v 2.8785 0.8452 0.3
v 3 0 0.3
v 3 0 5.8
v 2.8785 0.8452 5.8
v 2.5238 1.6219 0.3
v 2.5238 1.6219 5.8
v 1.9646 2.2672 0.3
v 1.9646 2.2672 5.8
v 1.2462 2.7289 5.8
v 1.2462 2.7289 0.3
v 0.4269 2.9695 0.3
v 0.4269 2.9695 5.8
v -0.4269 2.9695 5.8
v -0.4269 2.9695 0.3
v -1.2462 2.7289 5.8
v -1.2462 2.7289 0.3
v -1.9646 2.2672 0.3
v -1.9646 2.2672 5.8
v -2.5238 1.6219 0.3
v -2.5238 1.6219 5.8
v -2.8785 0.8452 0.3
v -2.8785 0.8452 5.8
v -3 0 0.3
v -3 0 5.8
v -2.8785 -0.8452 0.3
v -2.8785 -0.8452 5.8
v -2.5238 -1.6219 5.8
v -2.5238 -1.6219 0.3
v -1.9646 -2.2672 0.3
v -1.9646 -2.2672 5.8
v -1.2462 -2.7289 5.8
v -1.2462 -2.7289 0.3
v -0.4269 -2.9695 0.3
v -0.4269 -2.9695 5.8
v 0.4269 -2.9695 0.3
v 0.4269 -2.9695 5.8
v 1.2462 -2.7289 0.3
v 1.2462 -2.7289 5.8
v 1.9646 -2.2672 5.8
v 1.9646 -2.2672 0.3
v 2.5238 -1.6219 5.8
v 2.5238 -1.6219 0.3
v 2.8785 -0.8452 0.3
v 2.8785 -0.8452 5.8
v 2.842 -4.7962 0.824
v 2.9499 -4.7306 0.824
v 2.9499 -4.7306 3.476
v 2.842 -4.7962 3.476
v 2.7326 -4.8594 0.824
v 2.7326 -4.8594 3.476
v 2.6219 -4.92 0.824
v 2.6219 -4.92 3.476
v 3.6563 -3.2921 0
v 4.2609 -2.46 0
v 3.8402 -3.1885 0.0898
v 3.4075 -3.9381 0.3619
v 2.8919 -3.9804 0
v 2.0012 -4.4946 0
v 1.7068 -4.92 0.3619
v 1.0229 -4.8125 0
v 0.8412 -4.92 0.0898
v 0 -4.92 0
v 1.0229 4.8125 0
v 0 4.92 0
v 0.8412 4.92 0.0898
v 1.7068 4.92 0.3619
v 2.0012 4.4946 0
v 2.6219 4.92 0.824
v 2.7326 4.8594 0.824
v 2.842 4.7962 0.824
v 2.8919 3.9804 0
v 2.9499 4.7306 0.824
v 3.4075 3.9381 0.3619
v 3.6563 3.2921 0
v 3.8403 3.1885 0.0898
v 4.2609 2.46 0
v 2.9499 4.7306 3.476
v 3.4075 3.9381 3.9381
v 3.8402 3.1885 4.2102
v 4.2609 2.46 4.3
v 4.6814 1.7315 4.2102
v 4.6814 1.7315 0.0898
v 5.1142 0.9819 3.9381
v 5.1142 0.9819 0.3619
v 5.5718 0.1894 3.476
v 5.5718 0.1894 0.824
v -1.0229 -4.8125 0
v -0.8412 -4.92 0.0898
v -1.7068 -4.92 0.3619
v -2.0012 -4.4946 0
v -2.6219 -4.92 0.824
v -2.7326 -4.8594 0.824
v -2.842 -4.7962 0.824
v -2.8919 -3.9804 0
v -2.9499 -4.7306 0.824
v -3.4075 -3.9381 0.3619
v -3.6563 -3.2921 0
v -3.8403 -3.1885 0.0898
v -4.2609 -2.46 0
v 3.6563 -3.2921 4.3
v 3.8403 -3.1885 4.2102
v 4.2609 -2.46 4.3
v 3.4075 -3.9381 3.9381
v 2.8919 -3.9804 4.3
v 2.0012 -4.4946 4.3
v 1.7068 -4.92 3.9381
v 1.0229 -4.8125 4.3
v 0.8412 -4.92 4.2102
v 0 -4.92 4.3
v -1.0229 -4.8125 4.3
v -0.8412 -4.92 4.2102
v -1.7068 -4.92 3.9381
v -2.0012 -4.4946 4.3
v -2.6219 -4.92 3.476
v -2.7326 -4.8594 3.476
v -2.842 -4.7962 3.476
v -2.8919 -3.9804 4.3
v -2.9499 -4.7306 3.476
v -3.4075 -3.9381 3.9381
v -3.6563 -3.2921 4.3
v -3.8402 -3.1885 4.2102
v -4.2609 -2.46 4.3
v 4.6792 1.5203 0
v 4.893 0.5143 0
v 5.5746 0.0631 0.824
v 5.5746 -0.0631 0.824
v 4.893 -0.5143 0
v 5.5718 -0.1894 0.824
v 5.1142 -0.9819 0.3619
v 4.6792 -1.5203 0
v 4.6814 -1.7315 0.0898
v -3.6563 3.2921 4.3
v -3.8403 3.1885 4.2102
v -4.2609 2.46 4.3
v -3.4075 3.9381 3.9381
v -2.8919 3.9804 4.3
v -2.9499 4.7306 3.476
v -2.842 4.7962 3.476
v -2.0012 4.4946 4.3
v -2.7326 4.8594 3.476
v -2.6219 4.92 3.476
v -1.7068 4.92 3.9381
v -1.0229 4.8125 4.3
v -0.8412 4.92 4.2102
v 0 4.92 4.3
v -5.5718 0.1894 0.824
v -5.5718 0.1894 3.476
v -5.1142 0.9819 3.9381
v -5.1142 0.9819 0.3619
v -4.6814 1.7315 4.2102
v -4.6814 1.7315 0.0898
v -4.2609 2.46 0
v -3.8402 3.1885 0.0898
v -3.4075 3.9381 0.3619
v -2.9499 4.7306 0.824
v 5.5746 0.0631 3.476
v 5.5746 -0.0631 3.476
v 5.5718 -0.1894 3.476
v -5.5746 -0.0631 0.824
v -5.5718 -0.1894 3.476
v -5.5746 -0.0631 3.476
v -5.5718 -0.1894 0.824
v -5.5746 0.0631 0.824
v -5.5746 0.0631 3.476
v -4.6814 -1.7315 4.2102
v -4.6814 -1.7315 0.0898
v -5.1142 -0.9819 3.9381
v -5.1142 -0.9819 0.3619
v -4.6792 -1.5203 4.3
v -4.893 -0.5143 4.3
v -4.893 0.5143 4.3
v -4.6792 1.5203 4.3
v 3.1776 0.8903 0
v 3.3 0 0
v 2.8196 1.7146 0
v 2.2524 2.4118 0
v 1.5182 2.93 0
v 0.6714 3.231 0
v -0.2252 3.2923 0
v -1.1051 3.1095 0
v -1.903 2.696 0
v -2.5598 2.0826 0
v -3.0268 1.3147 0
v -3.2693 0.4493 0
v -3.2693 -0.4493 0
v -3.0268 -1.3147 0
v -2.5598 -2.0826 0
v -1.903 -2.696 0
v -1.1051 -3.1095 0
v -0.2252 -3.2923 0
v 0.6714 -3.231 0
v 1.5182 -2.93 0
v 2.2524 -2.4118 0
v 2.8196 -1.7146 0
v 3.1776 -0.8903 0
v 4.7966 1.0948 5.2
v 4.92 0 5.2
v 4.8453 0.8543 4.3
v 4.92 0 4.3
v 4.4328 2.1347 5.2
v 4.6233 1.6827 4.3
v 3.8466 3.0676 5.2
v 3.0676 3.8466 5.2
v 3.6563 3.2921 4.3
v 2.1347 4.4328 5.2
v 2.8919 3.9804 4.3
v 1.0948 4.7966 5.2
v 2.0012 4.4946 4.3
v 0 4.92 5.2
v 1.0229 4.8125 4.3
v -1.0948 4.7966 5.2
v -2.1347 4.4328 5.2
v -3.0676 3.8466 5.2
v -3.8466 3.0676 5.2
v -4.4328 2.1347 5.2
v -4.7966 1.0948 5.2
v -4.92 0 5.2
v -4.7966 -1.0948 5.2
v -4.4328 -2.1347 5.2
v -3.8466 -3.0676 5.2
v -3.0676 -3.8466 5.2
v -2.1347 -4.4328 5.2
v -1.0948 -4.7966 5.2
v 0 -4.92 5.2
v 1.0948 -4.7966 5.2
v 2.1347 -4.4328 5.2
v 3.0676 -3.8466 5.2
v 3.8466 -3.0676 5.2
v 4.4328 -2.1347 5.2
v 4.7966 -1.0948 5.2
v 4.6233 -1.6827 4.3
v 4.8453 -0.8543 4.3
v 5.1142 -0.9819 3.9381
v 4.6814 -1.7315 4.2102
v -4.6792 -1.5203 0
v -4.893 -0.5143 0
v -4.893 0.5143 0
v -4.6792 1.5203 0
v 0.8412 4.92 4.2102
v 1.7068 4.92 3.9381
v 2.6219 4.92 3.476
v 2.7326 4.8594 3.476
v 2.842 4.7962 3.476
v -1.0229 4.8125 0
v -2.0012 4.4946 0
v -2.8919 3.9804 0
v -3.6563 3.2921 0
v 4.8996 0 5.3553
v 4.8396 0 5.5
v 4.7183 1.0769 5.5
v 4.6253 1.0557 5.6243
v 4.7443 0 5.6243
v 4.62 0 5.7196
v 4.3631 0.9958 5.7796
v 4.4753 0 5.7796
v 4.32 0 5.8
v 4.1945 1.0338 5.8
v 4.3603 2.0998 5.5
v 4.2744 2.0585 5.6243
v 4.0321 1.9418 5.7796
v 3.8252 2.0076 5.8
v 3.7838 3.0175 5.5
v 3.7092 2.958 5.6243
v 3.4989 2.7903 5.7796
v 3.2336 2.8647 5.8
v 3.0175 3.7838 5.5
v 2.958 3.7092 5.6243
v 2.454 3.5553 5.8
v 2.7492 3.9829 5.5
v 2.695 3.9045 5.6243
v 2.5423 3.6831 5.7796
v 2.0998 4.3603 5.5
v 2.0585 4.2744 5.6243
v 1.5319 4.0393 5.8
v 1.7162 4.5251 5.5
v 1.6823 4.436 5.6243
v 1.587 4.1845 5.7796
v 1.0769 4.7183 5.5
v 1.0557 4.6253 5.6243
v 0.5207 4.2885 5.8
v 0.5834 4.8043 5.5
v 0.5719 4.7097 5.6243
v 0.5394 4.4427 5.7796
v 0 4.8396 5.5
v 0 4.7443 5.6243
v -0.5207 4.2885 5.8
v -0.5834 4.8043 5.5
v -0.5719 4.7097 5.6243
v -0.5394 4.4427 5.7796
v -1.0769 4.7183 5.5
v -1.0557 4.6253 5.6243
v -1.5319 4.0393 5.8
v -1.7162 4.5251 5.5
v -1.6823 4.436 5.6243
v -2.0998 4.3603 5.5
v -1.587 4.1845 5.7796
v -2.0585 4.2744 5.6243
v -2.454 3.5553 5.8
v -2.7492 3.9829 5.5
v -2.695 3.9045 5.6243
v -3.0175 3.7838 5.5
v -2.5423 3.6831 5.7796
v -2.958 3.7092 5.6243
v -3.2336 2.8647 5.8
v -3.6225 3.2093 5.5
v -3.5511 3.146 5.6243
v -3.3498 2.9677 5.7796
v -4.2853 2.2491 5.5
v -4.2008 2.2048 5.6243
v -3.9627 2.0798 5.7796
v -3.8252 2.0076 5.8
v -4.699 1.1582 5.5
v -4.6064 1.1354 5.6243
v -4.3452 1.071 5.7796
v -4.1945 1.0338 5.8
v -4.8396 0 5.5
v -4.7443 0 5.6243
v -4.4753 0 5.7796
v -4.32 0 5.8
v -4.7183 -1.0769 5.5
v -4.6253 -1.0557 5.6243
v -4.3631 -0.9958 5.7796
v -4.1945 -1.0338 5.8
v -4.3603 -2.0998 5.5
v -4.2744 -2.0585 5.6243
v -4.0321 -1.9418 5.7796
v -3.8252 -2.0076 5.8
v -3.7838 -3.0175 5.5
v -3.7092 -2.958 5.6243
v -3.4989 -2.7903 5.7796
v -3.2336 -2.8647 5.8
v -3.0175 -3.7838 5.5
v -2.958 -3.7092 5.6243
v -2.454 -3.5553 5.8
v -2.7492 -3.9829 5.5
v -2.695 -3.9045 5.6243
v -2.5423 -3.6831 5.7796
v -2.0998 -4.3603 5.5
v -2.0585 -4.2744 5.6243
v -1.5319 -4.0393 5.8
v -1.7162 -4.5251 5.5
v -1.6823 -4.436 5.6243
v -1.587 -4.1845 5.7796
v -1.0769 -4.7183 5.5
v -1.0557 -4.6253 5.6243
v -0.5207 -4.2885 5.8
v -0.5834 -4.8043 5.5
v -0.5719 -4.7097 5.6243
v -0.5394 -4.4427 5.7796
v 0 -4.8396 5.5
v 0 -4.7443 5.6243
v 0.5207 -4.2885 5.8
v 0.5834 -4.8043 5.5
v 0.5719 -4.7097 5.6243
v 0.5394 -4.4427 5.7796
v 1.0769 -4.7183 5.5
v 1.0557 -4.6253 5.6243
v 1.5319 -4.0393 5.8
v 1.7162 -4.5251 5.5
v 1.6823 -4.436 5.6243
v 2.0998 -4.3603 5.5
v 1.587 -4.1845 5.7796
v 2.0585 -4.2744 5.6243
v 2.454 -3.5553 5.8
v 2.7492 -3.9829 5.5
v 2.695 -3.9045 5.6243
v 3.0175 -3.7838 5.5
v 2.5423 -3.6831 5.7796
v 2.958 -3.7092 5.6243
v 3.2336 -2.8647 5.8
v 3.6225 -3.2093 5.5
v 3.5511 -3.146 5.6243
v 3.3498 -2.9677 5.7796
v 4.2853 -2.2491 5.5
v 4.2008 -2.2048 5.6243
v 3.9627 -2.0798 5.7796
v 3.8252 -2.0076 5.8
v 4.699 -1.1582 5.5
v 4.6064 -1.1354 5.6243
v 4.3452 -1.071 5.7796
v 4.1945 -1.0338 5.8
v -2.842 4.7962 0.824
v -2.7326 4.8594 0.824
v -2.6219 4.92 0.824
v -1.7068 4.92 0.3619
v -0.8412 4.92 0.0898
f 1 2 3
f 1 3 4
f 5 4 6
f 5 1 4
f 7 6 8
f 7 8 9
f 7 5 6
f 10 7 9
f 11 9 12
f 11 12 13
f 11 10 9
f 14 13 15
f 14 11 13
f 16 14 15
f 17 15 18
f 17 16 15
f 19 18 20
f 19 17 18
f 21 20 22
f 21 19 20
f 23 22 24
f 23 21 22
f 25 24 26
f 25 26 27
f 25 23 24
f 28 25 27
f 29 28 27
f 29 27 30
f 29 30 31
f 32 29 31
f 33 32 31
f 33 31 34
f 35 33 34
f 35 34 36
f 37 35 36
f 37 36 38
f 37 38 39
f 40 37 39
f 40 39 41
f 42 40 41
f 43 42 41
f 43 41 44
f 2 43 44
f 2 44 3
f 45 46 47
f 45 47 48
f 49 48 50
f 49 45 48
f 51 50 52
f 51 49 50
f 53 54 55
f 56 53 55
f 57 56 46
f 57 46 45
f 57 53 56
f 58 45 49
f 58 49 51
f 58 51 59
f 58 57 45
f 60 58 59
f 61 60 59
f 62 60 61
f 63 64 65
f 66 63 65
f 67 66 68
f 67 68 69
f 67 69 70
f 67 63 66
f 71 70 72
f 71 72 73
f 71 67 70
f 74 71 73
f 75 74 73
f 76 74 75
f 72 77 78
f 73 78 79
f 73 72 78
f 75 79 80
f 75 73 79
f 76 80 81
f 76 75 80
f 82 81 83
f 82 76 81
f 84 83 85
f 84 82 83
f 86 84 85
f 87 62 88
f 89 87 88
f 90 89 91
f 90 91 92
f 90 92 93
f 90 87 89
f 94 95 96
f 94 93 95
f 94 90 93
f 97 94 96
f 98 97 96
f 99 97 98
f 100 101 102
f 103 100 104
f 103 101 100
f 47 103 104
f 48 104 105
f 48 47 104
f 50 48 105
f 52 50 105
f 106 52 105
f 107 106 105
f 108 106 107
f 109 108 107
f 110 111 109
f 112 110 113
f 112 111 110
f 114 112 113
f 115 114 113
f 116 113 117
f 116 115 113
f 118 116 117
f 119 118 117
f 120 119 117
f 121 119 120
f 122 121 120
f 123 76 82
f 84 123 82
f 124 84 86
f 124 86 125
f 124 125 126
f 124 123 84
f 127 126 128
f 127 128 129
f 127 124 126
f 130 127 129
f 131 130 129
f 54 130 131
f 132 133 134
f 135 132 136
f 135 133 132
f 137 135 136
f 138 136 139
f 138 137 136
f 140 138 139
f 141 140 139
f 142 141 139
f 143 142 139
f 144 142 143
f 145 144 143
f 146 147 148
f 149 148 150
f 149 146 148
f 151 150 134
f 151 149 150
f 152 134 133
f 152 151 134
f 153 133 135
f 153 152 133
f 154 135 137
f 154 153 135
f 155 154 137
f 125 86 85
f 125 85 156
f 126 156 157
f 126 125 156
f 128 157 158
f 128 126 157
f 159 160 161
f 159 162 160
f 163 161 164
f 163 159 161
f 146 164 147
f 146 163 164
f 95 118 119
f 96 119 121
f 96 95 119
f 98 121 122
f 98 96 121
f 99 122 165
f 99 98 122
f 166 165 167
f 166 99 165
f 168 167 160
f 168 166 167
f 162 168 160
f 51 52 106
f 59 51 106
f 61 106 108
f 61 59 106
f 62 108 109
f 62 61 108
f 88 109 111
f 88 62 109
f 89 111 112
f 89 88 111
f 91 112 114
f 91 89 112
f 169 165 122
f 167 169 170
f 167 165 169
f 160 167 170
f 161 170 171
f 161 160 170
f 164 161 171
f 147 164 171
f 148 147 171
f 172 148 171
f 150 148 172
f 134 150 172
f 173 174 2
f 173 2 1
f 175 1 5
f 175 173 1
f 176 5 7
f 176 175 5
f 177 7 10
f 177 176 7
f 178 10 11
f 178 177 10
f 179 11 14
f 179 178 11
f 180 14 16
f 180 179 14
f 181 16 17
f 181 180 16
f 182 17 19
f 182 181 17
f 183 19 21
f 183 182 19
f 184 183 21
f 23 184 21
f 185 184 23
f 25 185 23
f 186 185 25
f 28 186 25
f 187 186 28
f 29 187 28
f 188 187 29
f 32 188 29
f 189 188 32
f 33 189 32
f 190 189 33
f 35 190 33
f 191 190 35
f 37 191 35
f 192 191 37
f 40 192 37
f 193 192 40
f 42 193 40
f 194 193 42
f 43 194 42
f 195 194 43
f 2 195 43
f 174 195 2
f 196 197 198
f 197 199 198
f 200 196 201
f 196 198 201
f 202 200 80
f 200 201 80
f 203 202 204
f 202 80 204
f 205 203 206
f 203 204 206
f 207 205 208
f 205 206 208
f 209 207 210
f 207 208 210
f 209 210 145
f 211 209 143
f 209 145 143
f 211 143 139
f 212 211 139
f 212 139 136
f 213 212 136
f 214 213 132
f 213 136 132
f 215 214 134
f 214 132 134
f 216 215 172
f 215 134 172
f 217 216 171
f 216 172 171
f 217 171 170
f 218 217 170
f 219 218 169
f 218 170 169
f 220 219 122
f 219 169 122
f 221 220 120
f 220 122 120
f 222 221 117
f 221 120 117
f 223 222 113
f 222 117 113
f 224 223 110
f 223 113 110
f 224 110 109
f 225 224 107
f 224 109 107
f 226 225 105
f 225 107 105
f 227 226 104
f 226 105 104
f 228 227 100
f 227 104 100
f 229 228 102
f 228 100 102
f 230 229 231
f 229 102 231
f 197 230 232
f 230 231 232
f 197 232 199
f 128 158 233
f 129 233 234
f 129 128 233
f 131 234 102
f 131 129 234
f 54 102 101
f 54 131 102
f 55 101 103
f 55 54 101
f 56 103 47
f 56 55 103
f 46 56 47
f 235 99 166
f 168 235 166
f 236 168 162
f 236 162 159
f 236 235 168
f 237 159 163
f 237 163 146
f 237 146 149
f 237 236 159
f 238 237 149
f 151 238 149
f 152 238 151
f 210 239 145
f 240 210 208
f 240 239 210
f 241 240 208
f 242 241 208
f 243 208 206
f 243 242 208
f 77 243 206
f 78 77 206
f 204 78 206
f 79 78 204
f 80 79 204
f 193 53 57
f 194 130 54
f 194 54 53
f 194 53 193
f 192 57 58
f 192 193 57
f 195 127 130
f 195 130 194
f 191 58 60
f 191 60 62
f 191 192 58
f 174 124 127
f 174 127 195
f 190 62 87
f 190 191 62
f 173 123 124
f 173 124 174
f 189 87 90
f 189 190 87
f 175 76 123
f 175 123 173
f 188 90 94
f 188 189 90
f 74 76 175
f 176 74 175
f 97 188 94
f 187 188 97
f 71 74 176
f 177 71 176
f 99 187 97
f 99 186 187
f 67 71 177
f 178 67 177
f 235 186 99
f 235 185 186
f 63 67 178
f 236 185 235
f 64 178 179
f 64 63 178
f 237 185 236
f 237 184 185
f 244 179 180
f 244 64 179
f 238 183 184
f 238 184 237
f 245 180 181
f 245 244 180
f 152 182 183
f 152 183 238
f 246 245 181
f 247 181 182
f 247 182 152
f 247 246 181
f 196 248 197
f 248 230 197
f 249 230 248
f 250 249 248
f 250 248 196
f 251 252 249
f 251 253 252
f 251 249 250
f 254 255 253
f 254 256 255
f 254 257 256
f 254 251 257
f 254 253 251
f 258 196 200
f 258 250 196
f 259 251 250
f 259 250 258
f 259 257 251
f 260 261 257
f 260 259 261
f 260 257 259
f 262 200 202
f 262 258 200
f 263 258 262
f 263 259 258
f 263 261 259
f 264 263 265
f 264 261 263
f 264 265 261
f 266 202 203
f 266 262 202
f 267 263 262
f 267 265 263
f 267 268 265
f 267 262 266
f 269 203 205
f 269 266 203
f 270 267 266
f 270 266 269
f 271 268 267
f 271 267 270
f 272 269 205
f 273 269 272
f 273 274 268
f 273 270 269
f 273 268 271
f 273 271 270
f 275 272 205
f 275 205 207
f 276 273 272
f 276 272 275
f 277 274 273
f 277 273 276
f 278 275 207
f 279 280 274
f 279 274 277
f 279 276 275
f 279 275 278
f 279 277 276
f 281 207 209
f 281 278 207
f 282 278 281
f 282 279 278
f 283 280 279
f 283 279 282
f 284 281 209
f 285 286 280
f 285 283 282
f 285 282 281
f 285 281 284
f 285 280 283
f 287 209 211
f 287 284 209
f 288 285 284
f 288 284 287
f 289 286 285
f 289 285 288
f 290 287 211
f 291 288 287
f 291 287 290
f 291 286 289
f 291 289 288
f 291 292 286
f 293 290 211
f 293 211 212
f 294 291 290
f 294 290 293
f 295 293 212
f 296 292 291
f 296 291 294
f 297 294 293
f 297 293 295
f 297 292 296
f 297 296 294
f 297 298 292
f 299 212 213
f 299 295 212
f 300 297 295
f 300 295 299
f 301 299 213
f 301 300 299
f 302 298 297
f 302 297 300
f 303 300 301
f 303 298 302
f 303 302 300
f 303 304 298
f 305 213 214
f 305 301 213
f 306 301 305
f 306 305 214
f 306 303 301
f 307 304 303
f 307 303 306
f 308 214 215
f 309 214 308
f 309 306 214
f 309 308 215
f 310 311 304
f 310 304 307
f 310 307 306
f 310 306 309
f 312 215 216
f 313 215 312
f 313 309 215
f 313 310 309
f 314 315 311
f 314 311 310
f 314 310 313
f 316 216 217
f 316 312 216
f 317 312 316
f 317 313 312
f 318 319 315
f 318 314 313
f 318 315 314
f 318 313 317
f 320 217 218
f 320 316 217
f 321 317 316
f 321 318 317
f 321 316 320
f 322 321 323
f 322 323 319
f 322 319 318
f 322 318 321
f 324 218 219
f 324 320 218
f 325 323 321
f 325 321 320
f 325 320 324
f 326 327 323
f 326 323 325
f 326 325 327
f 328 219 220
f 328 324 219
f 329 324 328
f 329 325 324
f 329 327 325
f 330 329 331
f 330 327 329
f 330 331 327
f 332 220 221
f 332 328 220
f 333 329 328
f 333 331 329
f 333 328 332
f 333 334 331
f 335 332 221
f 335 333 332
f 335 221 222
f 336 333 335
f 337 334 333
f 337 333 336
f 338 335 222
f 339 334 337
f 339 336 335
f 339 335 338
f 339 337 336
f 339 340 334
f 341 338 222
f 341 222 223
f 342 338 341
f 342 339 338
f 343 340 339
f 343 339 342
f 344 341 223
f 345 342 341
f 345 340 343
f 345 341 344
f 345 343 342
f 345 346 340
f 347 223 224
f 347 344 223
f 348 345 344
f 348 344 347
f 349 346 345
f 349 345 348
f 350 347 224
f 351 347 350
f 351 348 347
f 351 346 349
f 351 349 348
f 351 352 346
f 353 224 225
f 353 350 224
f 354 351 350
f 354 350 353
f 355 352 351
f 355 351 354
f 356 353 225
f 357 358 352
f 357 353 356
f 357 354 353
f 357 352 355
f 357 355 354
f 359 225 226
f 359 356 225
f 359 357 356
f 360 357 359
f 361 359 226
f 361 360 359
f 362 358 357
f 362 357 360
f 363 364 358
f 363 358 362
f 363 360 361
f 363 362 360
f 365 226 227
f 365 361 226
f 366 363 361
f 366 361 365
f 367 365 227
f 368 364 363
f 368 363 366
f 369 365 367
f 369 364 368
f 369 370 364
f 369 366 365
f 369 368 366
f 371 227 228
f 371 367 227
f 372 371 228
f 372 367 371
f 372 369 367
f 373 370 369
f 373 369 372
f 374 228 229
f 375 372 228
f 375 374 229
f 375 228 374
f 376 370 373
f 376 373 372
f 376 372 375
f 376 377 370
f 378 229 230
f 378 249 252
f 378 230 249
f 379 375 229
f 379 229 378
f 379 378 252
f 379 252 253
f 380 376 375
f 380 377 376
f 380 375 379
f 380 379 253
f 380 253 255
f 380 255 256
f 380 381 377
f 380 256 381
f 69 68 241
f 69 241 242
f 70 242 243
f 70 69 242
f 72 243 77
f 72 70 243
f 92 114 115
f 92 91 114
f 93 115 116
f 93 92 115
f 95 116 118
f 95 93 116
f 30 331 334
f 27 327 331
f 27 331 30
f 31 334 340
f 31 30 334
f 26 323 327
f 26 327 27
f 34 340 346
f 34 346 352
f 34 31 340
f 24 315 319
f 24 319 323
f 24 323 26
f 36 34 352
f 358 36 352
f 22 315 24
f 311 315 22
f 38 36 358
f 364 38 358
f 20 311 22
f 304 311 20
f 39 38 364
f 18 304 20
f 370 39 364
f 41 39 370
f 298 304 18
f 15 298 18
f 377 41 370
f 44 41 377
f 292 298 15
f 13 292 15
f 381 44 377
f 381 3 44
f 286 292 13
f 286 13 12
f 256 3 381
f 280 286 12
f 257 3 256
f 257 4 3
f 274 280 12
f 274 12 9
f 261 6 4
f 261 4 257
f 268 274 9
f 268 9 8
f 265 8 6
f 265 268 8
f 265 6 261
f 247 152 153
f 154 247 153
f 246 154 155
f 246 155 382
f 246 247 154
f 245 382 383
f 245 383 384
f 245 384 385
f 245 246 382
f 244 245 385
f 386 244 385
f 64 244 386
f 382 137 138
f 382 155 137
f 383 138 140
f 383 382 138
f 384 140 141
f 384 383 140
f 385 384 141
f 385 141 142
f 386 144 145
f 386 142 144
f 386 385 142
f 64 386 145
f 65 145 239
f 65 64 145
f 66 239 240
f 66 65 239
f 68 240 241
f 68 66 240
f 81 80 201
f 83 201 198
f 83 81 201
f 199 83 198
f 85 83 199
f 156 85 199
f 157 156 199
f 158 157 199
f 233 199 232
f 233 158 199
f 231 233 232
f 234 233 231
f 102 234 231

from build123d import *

# Parameters (mm, degrees)
SKETCH1_R           = 3
BOSS_EXTRUDE1_DEPTH = 4.3
SKETCH2_R           = 4.92
SKETCH2_R_2         = 3
BOSS_EXTRUDE2_DEPTH = 1.5
FILLET1_R           = 0.6
CHAMFER1_SIZE       = 0.3


with BuildPart() as part:
    # Sketch1 → Boss-Extrude1 (new body)
    with BuildSketch(Plane.XY):
        Polygon((-2.840563324, 4.92), (2.840563324, 4.92), (5.681126649, 0), (2.840563324, -4.92), (-2.840563324, -4.92), (-5.681126649, 0), align=None)
        Circle(SKETCH1_R, mode=Mode.SUBTRACT)
    extrude(amount=BOSS_EXTRUDE1_DEPTH)

    # Sketch2 → Boss-Extrude2 (add)
    with BuildSketch(Plane.XY.offset(4.3)):
        Circle(SKETCH2_R)
        Circle(SKETCH2_R_2, mode=Mode.SUBTRACT)
    extrude(amount=BOSS_EXTRUDE2_DEPTH)

    # Fillet1
    fillet1_edges = [part.edges().sort_by_distance(p)[0] for p in [
        (-4.92, 0, 5.8),
    ]]
    fillet(fillet1_edges, radius=FILLET1_R)

    # Sketch3 → Cut-Revolve1 (revolve, cut)
    with BuildSketch(Plane(origin=(0, 0, 0), x_dir=(0, 0, -1), z_dir=(1, 0, 0))):
        Polygon((-4.3, 4.92), (-3.475971619, 5.575), (-0.824028381, 5.575), (0, 4.92), (0, 6.412884747), (-4.3, 6.412884747), align=None)
    revolve(axis=Axis((0, 0, 0), (0, 0, -1)), mode=Mode.SUBTRACT)

    # Chamfer1
    chamfer1_edges = [part.edges().sort_by_distance(p)[0] for p in [
        (-3, 0, 0),
    ]]
    chamfer(chamfer1_edges, length=CHAMFER1_SIZE)


solid = part.part
